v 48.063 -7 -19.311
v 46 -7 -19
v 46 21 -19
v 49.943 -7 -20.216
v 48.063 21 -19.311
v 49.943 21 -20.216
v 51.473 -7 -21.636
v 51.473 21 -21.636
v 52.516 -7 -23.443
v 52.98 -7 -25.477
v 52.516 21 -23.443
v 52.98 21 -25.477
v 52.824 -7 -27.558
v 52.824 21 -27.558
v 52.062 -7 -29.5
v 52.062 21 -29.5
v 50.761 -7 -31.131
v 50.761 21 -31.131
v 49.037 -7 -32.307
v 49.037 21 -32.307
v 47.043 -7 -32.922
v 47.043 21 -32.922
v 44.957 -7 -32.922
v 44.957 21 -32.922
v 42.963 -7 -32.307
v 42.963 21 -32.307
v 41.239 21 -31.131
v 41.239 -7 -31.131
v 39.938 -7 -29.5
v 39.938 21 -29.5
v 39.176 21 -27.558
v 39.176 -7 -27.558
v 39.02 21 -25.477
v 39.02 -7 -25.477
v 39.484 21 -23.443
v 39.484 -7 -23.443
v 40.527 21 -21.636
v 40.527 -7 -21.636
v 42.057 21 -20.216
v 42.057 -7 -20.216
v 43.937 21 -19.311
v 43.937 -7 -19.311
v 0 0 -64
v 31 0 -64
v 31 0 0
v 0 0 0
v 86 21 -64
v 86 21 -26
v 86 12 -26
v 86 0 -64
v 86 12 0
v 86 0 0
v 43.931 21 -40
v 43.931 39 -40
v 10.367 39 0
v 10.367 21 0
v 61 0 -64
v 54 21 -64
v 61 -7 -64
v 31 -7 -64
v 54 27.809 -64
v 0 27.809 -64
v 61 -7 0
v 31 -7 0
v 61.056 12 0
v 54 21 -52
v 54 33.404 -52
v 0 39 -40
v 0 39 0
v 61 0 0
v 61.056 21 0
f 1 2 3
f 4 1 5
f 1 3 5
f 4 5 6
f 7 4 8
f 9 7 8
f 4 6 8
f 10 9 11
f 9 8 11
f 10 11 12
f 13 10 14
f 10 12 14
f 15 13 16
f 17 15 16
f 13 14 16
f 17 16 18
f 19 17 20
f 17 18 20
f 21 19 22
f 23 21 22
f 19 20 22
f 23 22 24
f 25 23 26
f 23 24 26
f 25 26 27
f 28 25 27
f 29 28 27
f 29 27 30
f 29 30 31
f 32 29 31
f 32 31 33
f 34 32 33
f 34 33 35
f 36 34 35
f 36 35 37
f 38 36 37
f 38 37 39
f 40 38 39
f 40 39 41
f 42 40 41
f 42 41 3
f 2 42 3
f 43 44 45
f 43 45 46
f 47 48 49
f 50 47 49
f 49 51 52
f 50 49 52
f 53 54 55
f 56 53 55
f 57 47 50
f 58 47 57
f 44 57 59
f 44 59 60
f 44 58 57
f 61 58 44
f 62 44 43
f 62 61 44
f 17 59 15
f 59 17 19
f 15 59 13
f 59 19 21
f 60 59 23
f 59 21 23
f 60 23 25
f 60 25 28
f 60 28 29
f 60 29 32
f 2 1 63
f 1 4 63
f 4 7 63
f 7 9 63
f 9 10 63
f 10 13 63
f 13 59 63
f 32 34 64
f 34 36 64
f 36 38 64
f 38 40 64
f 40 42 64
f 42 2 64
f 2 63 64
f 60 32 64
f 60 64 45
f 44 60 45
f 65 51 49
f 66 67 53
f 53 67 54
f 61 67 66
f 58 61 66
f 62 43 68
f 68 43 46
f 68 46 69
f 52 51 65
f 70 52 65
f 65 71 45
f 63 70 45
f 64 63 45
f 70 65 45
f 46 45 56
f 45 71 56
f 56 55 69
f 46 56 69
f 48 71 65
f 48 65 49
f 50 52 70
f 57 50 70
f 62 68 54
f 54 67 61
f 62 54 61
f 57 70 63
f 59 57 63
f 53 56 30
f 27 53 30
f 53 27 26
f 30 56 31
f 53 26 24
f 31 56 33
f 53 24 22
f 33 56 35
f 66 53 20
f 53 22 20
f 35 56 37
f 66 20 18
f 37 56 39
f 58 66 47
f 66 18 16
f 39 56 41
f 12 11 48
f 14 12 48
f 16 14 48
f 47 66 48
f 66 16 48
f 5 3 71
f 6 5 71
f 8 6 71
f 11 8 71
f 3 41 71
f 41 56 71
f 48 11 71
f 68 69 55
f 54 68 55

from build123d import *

# Parameters (mm, degrees)
BOSS_EXTRUDE1_DEPTH = 64
CUT_EXTRUDE1_DEPTH  = 93.374238833
SKETCH4_R           = 7
CUT_EXTRUDE2_DEPTH  = 18
CUT_EXTRUDE7_REACH  = 118.653
SKETCH4_6_R         = 7
CUT_EXTRUDE8_START  = -18
CUT_EXTRUDE8_DEPTH  = 9


with BuildPart() as part:
    # Sketch1 → Boss-Extrude1 (new body)
    with BuildSketch(Plane.XY):
        Polygon((0, 0), (0, 39), (54, 39), (54, 21), (86, 21), (86, 0), (61, 0), (61, -7), (31, -7), (31, 0), align=None)
    extrude(amount=-BOSS_EXTRUDE1_DEPTH)

    # Sketch3 → Cut-Extrude1 (cut, through all)
    with BuildSketch(Plane(origin=(54, 0, 0), x_dir=(0, 0, -1), z_dir=(1, 0, 0))):
        Polygon((40, 39), (64, 27.808616204), (64, 39), align=None)
    extrude(amount=-CUT_EXTRUDE1_DEPTH, mode=Mode.SUBTRACT)

    # Sketch4 → Cut-Extrude2 (cut)
    # profile 1 of 2: a face of its own
    with BuildSketch(Plane(origin=(0, 39, 0), x_dir=(1, 0, 0), z_dir=(0, 1, 0))):
        Polygon((54, 40), (54, 52), (43.930804426, 40), align=None)
    # profile 2 of 2: a face of its own
    with BuildSketch(Plane(origin=(0, 39, 0), x_dir=(1, 0, 0), z_dir=(0, 1, 0))):
        Polygon((54, 40), (43.930804426, 40), (10.366819179, 0), (54, 0), align=None)
        with Locations((46, 26)):
            Circle(SKETCH4_R, mode=Mode.SUBTRACT)
    extrude(amount=-CUT_EXTRUDE2_DEPTH, mode=Mode.SUBTRACT)

    # Sketch4<6> → Cut-Extrude7 (cut, up to next)
    with BuildSketch(Plane(origin=(0, 39, 0), x_dir=(1, 0, 0), z_dir=(0, 1, 0)), mode=Mode.PRIVATE) as cut_extrude7_sk1:
        with Locations((46, 26)):
            Circle(SKETCH4_6_R)
    cut_extrude7_tool1 = extrude(cut_extrude7_sk1.sketch, amount=-CUT_EXTRUDE7_REACH, mode=Mode.PRIVATE) & part.part
    add(cut_extrude7_tool1.solids().sort_by_distance((46, 39, -26))[0], mode=Mode.SUBTRACT)

    # Sketch4<7> → Cut-Extrude8 (cut)
    with BuildSketch(Plane(origin=(0, 39, 0), x_dir=(1, 0, 0), z_dir=(0, 1, 0)).offset(CUT_EXTRUDE8_START)):
        Polygon((86, -0.057865332), (86, 26), (61, -0.057865332), align=None)
    extrude(amount=-CUT_EXTRUDE8_DEPTH, mode=Mode.SUBTRACT)


solid = part.part
